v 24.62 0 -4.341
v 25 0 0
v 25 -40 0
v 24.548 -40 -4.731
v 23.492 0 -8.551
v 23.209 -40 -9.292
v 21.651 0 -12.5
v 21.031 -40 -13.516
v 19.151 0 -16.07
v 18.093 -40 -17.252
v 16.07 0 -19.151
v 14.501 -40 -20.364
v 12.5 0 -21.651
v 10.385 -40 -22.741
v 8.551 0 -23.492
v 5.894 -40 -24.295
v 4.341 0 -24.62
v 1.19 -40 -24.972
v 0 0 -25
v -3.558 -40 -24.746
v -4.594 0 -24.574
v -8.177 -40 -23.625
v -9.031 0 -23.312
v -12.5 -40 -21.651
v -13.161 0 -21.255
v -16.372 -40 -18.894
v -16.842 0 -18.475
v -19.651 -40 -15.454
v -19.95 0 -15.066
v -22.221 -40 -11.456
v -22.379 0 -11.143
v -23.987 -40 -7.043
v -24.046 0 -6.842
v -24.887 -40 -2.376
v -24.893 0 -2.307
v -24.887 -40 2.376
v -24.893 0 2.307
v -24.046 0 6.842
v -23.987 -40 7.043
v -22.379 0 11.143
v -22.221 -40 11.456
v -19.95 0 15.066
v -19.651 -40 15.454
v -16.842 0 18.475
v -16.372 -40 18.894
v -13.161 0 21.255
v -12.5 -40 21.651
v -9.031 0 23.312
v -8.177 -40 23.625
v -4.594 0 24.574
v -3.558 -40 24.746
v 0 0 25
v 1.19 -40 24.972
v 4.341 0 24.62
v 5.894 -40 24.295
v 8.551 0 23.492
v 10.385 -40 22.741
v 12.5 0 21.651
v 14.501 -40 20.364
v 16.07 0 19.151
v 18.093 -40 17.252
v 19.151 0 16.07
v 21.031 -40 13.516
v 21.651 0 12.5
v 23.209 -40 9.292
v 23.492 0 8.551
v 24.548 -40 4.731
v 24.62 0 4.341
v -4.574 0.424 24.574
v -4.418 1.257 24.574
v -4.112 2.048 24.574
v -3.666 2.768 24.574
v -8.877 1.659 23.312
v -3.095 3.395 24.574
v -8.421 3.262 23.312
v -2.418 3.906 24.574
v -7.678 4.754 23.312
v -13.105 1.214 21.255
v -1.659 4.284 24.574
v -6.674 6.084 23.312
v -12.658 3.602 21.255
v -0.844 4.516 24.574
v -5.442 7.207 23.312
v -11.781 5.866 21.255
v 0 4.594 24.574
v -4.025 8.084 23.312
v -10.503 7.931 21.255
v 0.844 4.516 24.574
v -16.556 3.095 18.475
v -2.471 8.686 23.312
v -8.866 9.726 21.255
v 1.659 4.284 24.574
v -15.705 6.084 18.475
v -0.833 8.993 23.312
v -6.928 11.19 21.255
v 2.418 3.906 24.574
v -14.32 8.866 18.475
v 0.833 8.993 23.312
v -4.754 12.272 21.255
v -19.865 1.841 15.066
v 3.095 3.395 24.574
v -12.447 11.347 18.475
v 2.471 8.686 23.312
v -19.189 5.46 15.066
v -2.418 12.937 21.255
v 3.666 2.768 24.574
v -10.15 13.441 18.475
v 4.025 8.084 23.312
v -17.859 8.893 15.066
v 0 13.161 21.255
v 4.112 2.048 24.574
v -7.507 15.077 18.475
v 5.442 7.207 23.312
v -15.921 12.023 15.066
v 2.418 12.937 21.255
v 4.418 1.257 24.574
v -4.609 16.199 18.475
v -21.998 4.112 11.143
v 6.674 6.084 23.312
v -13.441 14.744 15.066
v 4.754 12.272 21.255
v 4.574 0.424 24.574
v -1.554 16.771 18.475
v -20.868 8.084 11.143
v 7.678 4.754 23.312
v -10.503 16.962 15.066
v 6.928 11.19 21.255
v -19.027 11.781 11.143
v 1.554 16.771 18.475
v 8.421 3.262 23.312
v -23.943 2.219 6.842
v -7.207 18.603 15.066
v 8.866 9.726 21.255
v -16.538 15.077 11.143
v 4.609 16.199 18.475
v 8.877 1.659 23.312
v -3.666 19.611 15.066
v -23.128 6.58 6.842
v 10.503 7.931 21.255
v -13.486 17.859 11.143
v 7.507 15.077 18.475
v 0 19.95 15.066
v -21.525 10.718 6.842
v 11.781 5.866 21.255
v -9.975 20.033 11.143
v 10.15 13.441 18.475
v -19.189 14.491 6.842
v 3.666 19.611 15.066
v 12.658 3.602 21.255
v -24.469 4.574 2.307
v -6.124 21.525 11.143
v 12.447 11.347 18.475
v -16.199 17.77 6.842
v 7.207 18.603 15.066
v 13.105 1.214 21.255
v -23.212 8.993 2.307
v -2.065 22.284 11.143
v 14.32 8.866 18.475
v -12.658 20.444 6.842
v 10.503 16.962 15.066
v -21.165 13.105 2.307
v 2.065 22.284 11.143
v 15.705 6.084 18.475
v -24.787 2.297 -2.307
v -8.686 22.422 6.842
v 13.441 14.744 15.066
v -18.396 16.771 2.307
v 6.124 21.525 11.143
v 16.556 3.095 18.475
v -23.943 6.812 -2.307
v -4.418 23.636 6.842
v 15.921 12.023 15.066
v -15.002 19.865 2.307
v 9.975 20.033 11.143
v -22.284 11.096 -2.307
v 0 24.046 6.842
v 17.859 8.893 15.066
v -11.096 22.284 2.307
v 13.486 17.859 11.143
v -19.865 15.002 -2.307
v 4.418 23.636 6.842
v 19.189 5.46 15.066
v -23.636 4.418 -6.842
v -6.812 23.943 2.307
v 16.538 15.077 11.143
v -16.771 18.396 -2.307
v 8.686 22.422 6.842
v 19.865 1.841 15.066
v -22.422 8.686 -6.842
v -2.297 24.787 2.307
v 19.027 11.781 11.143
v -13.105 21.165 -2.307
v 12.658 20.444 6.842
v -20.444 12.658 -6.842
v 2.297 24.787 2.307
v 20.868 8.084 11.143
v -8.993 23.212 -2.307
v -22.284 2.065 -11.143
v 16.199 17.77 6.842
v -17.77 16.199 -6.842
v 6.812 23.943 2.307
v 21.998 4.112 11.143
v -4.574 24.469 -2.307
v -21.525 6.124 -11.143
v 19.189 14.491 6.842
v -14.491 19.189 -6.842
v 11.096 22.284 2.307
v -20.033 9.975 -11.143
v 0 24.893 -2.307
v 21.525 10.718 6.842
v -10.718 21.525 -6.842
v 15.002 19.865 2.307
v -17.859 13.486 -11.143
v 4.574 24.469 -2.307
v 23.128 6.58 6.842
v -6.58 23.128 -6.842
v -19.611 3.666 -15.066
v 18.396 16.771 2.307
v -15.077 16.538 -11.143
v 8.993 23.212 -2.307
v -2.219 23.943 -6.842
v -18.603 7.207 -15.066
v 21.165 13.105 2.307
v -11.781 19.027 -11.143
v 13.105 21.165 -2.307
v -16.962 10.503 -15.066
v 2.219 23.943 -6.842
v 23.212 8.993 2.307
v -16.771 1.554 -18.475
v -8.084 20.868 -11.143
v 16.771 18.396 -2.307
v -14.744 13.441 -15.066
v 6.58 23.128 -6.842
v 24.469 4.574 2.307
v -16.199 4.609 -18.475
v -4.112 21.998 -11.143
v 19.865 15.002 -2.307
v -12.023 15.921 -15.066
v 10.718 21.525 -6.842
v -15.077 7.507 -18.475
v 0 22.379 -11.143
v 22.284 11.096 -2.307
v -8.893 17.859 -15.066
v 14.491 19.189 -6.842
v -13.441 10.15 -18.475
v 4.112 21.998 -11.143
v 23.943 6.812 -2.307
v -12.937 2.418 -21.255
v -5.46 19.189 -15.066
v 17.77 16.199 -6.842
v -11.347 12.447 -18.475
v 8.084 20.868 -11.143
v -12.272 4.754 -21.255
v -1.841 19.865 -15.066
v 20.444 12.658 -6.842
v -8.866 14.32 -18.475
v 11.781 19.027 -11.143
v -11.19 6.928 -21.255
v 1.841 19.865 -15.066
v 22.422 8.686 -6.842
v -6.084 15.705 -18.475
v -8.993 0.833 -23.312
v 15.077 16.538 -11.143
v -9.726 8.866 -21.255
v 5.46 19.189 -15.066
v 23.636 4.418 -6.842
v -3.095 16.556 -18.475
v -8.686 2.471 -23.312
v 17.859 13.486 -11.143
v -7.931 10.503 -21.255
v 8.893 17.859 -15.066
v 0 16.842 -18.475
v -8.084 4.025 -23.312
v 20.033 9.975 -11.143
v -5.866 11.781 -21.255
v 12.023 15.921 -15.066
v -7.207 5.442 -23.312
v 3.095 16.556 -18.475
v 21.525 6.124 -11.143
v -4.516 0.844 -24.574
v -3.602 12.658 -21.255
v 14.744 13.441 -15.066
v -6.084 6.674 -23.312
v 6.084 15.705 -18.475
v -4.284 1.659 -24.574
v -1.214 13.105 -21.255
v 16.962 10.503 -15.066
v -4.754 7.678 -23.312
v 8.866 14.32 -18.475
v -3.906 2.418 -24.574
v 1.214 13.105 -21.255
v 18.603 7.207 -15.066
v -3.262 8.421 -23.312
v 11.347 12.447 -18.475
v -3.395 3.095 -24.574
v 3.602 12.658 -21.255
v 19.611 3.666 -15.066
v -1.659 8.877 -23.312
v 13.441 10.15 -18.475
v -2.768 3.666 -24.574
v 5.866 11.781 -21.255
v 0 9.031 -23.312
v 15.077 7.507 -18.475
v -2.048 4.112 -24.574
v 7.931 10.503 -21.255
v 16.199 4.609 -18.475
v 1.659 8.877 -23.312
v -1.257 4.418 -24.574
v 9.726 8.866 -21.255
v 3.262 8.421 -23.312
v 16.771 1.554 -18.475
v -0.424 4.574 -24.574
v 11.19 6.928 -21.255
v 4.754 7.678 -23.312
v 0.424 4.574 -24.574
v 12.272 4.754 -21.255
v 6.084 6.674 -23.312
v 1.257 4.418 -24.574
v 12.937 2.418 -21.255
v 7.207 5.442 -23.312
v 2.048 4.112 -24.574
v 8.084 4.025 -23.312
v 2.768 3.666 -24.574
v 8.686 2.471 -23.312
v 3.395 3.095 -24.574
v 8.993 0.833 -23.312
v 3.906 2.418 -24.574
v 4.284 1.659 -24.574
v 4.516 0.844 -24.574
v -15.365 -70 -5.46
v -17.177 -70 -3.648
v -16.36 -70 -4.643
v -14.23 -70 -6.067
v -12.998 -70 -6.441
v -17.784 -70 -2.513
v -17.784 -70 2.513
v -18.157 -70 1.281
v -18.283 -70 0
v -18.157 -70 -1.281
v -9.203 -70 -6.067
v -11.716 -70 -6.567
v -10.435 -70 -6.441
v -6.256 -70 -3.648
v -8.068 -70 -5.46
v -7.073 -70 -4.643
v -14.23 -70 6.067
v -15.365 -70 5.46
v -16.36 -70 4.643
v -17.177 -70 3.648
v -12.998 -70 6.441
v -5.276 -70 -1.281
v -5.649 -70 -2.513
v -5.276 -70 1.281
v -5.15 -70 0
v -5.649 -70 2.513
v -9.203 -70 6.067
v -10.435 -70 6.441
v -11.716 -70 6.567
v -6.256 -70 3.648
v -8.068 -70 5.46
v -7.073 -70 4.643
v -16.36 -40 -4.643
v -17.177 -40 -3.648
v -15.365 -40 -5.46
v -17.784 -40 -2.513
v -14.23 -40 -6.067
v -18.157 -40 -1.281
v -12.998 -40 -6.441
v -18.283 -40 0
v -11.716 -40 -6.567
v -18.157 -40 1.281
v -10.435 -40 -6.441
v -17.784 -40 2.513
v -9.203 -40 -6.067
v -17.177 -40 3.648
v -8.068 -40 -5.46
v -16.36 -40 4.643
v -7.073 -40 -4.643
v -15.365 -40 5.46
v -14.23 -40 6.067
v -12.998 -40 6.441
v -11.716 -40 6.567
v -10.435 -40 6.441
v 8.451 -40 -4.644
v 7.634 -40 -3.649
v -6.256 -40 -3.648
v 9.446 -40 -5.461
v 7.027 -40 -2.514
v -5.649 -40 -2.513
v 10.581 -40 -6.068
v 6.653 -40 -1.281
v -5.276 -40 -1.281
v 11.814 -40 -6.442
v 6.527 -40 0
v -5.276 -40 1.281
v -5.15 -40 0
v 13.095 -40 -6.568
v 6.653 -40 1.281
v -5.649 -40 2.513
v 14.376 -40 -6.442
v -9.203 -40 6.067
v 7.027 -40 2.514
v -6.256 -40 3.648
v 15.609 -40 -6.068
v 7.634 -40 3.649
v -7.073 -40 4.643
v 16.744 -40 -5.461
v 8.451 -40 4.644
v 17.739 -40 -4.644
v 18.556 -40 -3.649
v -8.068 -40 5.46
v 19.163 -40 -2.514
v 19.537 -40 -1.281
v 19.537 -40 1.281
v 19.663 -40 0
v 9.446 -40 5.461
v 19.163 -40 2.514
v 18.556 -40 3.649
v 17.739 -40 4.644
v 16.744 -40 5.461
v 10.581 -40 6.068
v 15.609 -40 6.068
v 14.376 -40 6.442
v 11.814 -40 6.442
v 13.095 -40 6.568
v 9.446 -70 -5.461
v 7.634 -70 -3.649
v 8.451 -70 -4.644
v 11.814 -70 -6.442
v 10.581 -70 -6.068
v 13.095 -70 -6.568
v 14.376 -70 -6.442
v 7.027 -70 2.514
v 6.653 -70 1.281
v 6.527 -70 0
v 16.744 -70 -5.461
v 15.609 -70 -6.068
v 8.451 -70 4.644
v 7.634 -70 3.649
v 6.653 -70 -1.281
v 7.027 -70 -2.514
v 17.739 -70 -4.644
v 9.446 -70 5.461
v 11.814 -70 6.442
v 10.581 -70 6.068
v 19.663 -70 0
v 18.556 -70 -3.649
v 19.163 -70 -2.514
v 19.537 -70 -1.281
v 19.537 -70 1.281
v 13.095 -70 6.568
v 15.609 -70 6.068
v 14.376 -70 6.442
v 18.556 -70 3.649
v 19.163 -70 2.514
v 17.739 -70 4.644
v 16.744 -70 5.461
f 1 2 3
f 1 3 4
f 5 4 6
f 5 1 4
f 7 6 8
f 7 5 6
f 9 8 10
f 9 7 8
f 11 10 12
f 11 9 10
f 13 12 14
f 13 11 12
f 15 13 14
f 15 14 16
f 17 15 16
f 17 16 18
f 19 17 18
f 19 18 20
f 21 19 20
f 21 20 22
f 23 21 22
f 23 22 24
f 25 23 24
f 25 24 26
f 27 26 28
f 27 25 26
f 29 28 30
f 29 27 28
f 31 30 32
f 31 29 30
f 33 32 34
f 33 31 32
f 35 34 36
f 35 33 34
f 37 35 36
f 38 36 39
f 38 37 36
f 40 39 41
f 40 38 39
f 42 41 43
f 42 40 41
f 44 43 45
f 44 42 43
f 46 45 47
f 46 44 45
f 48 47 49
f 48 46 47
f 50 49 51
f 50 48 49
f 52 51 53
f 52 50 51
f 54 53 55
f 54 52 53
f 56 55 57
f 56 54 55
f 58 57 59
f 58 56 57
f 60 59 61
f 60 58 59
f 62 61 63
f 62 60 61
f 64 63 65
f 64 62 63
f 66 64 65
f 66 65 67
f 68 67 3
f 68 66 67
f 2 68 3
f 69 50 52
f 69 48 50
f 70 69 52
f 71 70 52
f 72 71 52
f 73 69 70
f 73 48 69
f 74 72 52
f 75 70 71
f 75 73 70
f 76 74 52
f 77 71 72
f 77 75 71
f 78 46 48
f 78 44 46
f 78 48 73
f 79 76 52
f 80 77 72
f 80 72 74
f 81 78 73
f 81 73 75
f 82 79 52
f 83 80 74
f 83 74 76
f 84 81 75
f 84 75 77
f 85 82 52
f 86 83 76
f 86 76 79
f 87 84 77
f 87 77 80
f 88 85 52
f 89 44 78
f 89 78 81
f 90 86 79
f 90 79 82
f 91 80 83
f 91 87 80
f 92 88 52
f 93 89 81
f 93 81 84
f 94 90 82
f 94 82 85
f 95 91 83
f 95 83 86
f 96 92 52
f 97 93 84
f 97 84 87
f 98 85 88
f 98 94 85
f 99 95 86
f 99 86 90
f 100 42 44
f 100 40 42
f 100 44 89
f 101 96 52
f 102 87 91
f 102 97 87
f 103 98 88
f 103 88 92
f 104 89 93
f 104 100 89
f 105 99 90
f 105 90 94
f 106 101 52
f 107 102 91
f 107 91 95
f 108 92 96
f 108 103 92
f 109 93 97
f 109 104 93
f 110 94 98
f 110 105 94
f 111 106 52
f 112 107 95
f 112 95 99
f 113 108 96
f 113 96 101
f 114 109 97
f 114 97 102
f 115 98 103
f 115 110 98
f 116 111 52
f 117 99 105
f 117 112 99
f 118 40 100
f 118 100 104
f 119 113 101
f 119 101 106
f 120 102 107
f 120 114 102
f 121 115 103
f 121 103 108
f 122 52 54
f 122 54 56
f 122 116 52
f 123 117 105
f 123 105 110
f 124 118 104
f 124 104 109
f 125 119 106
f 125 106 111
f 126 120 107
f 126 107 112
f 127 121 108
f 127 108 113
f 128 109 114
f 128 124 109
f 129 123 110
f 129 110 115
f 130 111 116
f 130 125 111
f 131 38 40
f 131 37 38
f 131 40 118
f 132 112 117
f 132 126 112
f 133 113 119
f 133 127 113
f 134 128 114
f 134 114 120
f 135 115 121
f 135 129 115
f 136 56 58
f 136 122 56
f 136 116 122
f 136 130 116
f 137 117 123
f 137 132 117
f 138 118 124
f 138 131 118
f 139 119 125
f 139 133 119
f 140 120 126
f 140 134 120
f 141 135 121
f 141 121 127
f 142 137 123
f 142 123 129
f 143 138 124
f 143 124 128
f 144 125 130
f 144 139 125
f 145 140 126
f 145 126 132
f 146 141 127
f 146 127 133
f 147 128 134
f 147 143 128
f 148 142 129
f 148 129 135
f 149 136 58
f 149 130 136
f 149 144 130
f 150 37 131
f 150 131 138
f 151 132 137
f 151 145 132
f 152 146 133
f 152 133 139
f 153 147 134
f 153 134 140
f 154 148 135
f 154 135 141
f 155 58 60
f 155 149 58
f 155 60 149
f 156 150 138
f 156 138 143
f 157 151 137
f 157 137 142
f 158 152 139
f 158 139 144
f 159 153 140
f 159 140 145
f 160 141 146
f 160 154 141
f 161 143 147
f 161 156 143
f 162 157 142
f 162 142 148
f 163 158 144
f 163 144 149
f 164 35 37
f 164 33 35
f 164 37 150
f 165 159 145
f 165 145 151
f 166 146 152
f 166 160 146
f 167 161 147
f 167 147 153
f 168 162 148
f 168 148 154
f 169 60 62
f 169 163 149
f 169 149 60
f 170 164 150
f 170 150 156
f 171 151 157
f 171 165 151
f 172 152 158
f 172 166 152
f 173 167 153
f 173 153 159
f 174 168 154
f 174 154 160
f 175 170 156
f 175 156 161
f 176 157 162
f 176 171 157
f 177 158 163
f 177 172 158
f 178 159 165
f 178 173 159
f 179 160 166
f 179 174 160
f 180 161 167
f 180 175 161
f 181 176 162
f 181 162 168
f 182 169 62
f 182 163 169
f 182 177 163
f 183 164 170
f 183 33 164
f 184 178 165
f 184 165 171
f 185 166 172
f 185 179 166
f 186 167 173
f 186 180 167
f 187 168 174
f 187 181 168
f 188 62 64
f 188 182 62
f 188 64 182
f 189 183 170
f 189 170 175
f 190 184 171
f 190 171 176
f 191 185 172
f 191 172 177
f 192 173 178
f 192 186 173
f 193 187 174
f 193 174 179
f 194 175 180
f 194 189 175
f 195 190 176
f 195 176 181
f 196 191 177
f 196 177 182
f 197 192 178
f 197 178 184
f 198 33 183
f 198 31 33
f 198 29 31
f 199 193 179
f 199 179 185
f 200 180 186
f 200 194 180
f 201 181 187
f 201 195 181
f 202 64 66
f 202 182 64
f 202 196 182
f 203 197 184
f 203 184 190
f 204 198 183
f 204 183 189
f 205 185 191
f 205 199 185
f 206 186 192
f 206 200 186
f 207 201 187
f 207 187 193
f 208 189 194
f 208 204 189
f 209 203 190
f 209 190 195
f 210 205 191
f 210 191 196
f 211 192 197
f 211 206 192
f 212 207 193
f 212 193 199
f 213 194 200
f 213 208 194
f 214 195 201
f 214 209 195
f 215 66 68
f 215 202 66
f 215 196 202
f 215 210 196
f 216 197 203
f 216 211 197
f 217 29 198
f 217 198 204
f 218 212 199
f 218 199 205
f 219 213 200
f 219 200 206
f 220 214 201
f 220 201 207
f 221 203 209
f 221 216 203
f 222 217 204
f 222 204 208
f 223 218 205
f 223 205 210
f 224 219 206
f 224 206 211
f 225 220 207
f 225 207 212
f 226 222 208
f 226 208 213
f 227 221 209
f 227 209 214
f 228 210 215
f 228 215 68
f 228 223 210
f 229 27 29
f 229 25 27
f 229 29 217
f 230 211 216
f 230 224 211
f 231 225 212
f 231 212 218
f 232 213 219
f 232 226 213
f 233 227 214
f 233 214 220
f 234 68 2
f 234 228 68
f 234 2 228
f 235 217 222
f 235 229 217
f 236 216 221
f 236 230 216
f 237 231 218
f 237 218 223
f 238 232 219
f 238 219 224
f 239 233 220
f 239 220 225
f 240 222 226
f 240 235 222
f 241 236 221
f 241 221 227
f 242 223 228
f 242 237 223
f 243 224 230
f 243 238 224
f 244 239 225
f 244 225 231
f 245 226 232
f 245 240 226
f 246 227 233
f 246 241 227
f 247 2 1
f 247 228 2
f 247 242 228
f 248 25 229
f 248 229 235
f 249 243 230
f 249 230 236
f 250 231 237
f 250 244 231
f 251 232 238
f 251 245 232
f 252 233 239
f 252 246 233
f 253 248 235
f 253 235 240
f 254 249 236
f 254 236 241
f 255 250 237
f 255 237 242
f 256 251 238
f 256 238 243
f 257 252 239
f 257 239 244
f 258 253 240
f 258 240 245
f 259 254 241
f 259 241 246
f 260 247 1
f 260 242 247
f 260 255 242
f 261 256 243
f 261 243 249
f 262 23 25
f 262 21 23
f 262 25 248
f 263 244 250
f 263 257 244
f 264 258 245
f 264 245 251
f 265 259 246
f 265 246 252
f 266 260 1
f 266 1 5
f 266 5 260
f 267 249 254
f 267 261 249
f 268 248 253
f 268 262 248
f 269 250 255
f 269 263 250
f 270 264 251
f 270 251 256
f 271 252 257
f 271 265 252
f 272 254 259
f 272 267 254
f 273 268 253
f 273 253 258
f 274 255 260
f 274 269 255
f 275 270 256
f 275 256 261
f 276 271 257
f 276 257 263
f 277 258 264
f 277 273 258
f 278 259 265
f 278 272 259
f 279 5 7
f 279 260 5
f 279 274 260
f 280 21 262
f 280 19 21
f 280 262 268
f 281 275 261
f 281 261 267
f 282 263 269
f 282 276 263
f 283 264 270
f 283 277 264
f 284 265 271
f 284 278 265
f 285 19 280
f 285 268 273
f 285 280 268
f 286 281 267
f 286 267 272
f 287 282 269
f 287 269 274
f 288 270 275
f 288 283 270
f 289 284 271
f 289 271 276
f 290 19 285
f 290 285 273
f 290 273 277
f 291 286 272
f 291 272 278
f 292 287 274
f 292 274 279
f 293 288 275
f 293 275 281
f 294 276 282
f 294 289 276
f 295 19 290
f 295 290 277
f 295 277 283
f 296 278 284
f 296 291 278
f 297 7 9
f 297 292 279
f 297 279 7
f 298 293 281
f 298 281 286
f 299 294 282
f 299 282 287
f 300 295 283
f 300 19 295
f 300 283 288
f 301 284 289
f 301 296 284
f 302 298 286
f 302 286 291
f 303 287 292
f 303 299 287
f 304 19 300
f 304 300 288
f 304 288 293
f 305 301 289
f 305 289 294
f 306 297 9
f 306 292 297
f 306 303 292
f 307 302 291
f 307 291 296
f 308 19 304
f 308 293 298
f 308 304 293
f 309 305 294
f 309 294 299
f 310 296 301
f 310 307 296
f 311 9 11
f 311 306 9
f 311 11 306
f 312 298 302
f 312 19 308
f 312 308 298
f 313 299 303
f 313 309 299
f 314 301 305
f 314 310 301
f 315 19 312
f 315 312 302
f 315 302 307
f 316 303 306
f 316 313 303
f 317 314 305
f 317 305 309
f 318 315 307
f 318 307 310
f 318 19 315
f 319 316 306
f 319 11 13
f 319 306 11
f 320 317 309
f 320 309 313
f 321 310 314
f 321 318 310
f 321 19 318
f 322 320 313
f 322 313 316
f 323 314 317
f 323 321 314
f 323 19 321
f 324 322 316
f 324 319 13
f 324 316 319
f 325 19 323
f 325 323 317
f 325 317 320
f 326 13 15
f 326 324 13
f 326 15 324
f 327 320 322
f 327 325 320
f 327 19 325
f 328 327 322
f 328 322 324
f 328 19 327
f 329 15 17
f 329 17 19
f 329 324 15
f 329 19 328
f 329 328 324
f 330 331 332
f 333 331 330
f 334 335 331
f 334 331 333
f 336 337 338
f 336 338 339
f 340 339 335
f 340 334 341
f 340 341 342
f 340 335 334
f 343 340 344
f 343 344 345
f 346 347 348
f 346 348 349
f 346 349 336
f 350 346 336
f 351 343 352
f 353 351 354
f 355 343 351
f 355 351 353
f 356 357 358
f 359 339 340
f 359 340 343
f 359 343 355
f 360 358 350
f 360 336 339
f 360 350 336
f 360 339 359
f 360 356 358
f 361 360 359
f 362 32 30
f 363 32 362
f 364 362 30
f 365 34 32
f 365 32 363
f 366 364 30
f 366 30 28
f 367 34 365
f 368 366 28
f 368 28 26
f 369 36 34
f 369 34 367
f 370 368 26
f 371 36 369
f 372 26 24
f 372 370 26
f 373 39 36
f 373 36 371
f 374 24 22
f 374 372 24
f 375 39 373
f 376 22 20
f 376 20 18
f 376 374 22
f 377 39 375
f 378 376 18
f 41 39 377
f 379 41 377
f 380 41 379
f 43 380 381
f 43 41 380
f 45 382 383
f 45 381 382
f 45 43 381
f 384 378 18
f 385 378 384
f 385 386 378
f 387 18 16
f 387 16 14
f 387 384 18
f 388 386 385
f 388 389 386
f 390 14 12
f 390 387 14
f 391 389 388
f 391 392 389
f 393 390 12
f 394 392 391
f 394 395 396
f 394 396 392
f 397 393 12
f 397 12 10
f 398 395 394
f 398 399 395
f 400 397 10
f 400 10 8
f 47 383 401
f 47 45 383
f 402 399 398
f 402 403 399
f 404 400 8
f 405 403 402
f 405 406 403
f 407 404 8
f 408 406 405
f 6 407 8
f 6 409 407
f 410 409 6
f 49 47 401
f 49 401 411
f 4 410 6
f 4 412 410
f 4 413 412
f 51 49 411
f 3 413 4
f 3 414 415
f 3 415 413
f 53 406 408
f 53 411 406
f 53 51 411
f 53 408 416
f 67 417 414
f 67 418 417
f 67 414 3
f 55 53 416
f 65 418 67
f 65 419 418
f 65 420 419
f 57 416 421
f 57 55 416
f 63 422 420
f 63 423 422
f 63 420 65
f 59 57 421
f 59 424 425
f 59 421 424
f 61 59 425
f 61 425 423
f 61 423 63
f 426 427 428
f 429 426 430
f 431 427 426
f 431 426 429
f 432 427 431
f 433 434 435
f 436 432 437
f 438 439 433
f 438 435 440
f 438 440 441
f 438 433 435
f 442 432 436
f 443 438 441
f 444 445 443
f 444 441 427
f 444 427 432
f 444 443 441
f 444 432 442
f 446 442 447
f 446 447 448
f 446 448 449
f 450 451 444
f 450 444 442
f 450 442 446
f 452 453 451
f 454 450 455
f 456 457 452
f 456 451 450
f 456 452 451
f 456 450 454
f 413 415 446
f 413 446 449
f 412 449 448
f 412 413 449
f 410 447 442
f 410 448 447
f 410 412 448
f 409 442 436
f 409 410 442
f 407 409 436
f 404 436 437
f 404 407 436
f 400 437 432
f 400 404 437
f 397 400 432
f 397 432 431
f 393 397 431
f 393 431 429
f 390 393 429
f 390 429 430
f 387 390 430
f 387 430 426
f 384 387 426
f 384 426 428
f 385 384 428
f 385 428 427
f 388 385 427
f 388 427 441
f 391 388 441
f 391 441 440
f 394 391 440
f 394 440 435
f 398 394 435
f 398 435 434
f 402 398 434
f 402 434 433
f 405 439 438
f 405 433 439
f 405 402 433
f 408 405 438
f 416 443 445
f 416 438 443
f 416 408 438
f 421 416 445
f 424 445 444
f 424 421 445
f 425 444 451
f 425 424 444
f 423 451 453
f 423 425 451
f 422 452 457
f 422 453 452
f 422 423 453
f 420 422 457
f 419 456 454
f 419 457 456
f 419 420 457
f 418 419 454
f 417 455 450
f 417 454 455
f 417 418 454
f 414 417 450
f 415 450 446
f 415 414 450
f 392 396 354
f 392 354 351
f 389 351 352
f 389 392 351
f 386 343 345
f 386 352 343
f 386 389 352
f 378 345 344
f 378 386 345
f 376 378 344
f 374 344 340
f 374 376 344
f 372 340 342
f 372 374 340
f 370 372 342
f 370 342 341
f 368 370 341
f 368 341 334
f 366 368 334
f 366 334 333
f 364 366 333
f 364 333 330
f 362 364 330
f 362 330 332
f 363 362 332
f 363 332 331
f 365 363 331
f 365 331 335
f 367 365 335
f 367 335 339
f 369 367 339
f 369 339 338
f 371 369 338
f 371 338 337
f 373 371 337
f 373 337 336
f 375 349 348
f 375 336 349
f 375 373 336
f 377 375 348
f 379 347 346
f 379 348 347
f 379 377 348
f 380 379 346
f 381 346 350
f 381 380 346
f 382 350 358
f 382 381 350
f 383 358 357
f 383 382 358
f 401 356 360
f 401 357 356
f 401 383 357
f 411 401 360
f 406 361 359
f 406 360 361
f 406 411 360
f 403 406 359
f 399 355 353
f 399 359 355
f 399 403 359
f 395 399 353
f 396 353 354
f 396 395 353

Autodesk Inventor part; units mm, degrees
ref_plane "YZ Plane" through (0, 0, 0) normal (1, 0, 0) x (0, 1, 0)
ref_plane "XZ Plane" through (0, 0, 0) normal (0, 1, 0) x (-1, 0, 0)
ref_plane "XY Plane" through (0, 0, 0) normal (0, 0, 1) x (1, 0, 0)
sketch "Sketch1" plane through (0, 0, 0) normal (0, 1, 0) x (-1, 0, 0)
  arc A0 (0, 25) -> (0, -25) centre (0, 0) ccw
  line L0 (0, 25) -> (0, -25)
  dimension "d0" = 50
revolve "Revolution1" add sketch "Sketch1" angle 180 about axis through (0, 0, 25) along (0, 0, 1)
sketch "Sketch2" plane through (0, 0, 0) normal (0, -1, 0) x (1, 0, 0)
  circle A0 centre (0, 0) radius 25
extrude "Extrusion1" add sketch "Sketch2" along normal blind 40
sketch "Sketch3" plane through (0, -40, 0) normal (0, -1, 0) x (1, 0, 0)
  circle A0 centre (-11.7165, 0) radius 6.5669
  circle A1 centre (13.095, 0) radius 6.5681
  point P0 (0, 0)
extrude "Extrusion2" add sketch "Sketch3" along normal blind 30
properties part number "red led now"
